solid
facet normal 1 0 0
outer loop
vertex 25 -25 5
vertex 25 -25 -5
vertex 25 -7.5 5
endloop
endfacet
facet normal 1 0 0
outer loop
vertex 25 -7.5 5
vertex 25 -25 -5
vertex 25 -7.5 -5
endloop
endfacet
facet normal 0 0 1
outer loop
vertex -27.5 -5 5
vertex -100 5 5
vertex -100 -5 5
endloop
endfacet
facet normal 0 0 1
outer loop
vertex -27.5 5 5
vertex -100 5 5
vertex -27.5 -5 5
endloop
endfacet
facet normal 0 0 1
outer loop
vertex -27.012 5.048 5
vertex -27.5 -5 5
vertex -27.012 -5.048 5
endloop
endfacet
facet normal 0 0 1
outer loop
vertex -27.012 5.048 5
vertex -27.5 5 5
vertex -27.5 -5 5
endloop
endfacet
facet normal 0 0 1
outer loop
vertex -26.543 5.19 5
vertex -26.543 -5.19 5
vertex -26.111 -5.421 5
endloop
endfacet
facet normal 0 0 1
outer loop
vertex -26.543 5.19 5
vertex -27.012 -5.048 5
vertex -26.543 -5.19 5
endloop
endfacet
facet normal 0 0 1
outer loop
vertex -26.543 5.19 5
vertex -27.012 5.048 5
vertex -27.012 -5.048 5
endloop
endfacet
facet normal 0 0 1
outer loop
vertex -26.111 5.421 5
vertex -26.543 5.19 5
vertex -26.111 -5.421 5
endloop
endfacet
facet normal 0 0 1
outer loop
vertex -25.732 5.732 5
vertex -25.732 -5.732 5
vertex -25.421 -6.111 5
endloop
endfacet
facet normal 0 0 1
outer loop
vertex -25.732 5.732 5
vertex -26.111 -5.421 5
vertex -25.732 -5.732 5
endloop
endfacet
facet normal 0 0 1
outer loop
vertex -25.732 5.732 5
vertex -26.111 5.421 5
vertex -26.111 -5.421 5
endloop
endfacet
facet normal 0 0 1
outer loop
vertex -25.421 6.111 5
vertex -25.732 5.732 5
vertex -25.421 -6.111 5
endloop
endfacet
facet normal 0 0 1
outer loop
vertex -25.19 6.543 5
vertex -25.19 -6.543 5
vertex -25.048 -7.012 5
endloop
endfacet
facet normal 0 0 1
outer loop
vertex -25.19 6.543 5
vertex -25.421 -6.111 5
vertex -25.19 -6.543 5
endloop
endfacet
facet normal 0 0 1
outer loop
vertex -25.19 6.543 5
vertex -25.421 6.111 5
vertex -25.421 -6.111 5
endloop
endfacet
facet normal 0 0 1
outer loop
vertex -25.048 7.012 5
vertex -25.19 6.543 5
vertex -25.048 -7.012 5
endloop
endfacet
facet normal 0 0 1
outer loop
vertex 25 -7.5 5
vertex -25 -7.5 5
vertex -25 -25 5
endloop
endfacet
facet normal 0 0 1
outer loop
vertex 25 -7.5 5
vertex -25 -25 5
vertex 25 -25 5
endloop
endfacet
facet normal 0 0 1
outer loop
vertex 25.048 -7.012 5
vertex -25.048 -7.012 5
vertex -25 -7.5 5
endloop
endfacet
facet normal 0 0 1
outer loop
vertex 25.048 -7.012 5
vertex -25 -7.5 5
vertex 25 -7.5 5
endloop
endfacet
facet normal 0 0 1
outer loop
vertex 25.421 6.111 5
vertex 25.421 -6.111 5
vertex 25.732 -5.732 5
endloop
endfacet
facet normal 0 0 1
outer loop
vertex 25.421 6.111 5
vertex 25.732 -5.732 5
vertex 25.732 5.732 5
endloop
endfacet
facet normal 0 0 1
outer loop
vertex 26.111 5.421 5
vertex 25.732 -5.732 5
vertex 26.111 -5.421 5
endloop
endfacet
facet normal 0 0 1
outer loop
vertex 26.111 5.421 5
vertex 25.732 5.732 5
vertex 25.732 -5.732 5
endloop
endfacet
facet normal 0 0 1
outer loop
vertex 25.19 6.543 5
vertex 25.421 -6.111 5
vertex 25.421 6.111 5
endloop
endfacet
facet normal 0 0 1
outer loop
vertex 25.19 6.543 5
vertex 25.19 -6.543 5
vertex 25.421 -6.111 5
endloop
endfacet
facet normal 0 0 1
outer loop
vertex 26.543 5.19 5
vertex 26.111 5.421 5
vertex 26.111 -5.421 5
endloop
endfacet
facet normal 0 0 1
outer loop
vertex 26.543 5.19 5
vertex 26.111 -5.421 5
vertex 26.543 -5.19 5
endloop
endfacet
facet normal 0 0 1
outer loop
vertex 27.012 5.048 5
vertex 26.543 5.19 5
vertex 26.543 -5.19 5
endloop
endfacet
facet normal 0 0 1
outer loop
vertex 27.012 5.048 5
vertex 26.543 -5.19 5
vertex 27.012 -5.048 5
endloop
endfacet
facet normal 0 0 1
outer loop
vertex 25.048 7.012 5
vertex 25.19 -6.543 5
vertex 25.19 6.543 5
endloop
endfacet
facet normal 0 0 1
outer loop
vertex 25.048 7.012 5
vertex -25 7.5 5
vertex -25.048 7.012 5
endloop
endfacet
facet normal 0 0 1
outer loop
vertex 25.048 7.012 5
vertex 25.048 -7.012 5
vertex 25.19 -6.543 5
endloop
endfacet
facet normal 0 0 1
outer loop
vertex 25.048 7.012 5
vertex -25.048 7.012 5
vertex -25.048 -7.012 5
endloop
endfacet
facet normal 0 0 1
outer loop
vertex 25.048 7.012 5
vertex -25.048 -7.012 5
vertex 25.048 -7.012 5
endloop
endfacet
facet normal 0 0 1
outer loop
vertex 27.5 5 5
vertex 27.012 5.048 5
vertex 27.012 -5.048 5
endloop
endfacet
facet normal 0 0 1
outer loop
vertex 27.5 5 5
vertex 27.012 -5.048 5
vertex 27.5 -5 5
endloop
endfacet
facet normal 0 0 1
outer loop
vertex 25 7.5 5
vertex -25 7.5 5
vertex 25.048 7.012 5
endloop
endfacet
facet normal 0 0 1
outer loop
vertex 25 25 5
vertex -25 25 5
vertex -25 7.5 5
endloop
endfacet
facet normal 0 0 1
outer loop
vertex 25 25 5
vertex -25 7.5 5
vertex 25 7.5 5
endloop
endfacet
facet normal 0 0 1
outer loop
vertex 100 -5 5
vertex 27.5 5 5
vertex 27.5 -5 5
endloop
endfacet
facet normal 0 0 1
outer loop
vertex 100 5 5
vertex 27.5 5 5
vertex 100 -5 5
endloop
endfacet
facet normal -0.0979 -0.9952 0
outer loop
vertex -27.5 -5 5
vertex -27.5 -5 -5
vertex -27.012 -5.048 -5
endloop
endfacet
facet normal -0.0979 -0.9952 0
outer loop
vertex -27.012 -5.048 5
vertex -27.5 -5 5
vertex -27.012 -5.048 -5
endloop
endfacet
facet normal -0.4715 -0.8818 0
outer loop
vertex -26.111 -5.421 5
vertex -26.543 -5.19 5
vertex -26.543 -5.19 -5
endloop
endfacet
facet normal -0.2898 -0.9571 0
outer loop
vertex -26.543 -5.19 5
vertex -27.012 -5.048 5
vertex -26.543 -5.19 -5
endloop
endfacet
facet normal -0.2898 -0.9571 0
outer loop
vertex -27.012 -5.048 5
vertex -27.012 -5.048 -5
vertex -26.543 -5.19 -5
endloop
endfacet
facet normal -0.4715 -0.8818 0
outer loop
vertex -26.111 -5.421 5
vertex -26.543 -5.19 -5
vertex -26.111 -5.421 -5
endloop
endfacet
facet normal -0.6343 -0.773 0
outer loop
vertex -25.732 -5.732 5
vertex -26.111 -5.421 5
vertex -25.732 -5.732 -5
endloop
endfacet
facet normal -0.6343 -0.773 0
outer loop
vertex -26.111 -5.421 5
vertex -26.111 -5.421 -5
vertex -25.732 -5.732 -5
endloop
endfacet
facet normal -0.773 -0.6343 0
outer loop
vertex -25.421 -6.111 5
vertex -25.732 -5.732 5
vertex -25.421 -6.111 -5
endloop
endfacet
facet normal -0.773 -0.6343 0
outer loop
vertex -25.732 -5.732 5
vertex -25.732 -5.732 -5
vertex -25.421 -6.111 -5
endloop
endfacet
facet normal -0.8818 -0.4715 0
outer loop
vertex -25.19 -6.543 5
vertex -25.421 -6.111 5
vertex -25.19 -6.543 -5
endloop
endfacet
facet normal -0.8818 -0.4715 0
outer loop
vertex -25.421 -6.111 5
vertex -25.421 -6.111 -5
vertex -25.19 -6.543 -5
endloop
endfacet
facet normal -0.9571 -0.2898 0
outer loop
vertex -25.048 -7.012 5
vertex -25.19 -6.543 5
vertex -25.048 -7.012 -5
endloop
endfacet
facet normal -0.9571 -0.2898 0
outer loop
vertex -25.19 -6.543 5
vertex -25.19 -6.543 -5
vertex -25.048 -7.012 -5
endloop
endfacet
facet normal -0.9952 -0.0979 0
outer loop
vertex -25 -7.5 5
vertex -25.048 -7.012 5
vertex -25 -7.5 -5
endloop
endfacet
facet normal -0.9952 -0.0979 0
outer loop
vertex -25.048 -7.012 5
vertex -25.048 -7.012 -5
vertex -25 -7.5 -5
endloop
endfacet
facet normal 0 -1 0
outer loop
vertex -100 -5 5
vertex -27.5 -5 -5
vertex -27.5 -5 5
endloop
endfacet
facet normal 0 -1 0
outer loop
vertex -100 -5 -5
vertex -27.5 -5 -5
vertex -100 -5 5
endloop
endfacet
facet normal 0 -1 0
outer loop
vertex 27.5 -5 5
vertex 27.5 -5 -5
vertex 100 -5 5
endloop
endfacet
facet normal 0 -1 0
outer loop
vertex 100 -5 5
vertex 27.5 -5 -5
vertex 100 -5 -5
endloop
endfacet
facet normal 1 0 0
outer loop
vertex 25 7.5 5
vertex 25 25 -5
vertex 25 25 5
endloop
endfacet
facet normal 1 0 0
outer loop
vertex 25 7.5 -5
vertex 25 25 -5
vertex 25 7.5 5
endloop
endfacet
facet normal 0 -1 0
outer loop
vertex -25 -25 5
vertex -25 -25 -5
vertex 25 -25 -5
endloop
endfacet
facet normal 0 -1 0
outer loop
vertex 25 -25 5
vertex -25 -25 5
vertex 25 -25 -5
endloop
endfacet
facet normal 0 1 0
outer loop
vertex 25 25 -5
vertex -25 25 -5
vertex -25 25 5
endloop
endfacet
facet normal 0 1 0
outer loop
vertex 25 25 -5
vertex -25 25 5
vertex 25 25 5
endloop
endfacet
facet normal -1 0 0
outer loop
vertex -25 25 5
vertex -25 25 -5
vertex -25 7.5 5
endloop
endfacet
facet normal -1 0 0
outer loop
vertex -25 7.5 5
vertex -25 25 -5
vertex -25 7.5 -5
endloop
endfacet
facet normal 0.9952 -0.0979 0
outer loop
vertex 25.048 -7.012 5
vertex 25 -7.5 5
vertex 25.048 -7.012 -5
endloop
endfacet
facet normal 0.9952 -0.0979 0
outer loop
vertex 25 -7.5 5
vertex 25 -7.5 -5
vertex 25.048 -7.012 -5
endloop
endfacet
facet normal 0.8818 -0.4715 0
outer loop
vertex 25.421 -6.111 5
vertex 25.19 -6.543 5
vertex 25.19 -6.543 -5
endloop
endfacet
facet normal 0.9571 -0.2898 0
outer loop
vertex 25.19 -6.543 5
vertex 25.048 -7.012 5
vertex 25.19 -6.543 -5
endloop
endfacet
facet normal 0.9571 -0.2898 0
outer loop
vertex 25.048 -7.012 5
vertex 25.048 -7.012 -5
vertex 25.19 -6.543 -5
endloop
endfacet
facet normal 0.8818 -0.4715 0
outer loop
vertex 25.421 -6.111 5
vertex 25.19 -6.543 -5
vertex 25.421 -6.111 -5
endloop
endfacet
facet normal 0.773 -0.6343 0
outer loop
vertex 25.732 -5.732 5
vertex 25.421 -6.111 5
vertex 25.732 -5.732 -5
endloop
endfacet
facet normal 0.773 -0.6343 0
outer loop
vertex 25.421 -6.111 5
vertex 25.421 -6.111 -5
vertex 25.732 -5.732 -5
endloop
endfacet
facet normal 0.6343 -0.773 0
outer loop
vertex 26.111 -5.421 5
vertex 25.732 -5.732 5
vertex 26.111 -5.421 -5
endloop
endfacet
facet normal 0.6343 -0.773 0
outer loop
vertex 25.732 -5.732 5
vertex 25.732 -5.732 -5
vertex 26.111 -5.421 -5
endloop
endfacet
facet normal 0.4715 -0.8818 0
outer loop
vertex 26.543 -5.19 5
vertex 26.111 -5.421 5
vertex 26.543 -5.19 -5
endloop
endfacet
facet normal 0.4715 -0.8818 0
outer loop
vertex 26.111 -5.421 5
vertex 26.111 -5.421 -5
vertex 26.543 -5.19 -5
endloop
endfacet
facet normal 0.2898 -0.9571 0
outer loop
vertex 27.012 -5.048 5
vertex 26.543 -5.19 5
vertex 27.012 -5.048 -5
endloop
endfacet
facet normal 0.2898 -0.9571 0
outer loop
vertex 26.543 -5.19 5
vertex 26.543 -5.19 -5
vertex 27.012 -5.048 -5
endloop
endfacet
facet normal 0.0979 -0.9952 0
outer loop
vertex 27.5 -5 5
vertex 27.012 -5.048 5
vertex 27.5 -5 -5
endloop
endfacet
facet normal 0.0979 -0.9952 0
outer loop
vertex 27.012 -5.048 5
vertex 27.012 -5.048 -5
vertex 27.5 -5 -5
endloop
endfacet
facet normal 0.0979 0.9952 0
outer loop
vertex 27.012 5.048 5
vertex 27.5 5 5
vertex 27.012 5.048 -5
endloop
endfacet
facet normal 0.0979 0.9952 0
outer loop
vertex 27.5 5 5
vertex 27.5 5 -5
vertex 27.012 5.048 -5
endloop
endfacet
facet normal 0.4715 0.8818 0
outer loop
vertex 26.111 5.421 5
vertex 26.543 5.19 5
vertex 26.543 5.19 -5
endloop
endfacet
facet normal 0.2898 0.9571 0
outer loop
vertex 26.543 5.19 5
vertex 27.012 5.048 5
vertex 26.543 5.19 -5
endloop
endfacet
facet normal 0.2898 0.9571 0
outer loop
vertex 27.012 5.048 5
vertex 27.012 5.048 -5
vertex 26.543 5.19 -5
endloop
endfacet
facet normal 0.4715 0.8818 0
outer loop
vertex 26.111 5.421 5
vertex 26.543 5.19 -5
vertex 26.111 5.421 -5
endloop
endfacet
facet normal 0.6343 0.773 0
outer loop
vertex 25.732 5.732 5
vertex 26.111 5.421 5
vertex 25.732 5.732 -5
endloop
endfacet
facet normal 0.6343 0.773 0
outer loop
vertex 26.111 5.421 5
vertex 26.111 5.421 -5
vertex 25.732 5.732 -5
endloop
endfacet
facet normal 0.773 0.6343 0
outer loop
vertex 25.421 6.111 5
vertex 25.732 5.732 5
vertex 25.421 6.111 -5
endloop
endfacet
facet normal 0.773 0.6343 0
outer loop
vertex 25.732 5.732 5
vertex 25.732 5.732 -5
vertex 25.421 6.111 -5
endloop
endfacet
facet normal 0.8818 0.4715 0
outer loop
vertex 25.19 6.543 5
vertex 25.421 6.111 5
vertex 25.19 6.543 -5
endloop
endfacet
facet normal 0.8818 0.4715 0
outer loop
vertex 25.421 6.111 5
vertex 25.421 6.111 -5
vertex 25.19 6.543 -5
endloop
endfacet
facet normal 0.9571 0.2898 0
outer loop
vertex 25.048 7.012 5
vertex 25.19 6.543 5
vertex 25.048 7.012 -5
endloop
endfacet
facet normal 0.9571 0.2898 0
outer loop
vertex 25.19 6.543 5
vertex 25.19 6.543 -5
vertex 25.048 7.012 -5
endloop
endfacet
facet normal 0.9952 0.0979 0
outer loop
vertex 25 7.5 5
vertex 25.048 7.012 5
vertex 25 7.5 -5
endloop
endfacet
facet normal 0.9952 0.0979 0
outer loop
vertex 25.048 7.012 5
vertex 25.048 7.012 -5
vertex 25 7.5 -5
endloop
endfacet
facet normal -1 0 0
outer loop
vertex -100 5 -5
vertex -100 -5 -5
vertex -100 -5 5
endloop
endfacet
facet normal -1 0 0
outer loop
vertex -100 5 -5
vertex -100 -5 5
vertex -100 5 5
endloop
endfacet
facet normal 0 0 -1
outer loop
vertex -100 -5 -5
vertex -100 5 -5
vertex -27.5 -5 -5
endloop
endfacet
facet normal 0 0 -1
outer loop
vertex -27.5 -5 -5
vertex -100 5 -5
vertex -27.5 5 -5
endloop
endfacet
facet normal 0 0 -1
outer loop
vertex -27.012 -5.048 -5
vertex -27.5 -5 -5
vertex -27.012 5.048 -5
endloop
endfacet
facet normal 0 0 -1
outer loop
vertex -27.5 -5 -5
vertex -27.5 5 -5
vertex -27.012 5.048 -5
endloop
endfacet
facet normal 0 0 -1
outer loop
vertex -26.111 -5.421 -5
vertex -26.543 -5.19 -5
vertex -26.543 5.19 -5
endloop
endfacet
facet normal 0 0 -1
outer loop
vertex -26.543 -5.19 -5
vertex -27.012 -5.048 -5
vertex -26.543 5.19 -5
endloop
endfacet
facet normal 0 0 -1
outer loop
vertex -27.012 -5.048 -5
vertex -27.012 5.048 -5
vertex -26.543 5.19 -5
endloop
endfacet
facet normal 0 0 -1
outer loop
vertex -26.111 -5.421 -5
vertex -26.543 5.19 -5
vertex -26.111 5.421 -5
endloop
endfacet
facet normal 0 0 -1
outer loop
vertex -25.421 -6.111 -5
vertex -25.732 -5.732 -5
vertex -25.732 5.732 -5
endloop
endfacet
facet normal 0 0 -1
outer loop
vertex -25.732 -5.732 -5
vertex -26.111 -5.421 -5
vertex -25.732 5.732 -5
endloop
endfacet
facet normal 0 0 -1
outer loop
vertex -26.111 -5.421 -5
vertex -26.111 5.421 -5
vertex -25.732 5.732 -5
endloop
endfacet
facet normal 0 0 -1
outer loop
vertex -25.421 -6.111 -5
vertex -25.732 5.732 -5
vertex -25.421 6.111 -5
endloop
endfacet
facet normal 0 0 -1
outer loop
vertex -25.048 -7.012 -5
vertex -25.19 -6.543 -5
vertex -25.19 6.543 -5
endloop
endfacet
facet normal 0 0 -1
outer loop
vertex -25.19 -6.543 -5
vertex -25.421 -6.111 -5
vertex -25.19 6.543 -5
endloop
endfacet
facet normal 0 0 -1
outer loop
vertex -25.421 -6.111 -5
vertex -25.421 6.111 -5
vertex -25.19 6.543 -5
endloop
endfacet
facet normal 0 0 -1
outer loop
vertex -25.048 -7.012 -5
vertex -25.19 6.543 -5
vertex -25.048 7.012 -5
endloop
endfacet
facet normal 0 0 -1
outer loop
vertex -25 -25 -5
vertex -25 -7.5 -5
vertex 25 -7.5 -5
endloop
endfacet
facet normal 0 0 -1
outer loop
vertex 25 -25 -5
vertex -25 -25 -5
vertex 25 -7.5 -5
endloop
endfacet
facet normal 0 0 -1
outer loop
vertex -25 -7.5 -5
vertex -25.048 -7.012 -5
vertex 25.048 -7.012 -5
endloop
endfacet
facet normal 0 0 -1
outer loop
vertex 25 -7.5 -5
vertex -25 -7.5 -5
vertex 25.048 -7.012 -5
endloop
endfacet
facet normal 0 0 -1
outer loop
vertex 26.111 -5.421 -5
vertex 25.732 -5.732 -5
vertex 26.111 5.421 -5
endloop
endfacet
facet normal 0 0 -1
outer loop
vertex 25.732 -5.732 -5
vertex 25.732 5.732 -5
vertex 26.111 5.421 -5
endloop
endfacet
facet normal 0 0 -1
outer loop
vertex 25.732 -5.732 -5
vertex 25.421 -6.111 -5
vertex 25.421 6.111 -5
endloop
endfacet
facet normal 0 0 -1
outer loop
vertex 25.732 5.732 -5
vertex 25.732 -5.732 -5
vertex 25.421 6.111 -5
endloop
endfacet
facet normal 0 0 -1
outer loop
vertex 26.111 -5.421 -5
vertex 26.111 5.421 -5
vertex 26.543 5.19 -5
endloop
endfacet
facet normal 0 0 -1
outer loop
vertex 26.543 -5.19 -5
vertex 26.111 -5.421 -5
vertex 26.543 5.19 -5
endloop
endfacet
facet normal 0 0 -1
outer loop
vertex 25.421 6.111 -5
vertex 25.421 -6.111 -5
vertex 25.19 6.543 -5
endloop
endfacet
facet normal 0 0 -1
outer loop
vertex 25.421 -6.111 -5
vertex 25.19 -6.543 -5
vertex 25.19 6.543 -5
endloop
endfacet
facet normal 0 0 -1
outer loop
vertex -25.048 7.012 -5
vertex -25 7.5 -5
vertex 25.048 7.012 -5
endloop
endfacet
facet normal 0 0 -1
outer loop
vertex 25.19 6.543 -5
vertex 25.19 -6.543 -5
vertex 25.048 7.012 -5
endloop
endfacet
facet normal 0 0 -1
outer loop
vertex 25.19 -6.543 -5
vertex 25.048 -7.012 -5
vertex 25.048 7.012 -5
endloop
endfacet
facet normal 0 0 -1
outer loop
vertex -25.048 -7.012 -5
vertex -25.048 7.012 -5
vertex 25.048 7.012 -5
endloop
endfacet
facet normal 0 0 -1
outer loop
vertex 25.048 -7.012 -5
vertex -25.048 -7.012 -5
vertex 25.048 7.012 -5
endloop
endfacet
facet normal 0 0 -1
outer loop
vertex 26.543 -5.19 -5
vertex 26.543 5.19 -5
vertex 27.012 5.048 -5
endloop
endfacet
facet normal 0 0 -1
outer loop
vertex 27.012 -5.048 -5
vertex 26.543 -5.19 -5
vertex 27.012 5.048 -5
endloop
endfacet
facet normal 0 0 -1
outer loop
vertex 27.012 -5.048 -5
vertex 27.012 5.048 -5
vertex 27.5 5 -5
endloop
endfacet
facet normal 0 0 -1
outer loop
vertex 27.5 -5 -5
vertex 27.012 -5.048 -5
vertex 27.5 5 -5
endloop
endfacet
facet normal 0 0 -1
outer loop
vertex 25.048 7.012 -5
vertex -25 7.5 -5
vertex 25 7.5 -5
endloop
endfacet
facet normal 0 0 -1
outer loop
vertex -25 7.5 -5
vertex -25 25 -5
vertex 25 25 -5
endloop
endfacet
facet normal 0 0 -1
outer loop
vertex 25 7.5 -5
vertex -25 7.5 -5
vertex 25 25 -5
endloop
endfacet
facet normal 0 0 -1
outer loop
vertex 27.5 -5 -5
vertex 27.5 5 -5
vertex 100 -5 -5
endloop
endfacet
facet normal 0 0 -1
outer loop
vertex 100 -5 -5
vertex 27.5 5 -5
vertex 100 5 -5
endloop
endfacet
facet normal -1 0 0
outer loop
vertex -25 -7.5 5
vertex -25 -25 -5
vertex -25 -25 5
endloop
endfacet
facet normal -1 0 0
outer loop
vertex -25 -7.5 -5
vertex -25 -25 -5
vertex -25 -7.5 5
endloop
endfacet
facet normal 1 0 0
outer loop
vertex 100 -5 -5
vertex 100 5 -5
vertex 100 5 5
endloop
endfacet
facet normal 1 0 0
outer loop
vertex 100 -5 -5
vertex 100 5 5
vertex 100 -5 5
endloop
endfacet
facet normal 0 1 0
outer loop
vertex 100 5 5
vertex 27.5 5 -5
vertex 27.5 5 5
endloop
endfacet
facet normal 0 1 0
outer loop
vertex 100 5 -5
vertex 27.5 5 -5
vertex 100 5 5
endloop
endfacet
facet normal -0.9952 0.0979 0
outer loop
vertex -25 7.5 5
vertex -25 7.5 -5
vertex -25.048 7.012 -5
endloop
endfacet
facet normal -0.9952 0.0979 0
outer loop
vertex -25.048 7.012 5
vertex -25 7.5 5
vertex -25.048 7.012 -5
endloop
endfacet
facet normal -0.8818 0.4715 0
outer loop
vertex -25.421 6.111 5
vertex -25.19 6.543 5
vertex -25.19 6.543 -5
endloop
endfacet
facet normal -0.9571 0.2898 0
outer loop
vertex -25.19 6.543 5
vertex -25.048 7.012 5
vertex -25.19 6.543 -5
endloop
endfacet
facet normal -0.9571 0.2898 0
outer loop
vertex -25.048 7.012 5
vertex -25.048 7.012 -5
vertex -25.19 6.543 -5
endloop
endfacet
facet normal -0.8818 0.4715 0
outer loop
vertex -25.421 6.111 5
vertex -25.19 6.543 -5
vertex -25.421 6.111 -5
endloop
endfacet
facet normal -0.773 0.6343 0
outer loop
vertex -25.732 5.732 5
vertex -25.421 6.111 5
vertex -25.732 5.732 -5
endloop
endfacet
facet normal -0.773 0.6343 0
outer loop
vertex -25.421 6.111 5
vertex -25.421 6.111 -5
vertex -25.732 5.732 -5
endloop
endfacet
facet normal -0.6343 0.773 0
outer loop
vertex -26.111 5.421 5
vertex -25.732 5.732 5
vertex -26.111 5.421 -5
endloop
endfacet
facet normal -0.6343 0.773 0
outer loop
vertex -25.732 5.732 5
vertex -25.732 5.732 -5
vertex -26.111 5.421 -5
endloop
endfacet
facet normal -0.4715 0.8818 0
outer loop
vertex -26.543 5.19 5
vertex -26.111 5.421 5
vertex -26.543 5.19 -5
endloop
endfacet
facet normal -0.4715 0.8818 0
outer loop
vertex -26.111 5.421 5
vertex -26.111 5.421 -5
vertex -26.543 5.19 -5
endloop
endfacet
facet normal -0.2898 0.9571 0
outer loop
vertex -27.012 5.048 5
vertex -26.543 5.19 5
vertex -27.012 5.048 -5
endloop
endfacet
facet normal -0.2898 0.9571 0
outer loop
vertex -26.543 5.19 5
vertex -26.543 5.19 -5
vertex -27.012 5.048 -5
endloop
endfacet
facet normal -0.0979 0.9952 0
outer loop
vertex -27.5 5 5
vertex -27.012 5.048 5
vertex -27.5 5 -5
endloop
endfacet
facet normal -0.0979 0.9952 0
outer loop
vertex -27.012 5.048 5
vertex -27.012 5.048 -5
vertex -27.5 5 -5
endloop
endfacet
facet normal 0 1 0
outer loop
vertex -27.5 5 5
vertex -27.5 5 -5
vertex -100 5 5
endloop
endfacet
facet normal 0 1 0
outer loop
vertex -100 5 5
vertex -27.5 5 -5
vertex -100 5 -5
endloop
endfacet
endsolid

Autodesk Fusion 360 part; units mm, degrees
sketch "Sketch1" plane through (0, 0, 0) normal (0, 0, 1) x (1, 0, 0)
  line L0 (0, 25) -> (25, 25)
  line L1 (25, 25) -> (25, 7.5)
  arc A0 (25, 7.5) -> (27.5, 5) centre (27.5, 7.5) ccw
  line L2 (27.5, 5) -> (100, 5)
  line L3 (100, 5) -> (100, 0)
  line L4 (0, 0) -> (0, 25) construction
  line L5 (0, 0) -> (100, 0) construction
  line L6 (0, -25) -> (25, -25)
  line L7 (25, -25) -> (25, -7.5)
  arc A1 (27.5, -5) -> (25, -7.5) centre (27.5, -7.5) ccw
  line L8 (27.5, -5) -> (100, -5)
  line L9 (100, -5) -> (100, 0)
  line L10 (0, 25) -> (-25, 25)
  line L11 (-25, 25) -> (-25, 7.5)
  arc A2 (-27.5, 5) -> (-25, 7.5) centre (-27.5, 7.5) ccw
  line L12 (-27.5, 5) -> (-100, 5)
  line L13 (-25, -25) -> (-25, -7.5)
  line L14 (-27.5, -5) -> (-100, -5)
  arc A3 (-25, -7.5) -> (-27.5, -5) centre (-27.5, -7.5) ccw
  line L15 (0, -25) -> (-25, -25)
  line L16 (-100, 5) -> (-100, 0)
  line L17 (-100, -5) -> (-100, 0)
  dimension "Fillet_Radius" = 2.5
  dimension "Shoulder_Height" = 20
  dimension "Shoulder_Width" = 50
  dimension "Total_Width" = 200
  dimension "Total_Height" = 50
extrude "Extrude1" add sketch "Sketch1" along normal mid plane 10
equation "Thickness = 1 cm"
